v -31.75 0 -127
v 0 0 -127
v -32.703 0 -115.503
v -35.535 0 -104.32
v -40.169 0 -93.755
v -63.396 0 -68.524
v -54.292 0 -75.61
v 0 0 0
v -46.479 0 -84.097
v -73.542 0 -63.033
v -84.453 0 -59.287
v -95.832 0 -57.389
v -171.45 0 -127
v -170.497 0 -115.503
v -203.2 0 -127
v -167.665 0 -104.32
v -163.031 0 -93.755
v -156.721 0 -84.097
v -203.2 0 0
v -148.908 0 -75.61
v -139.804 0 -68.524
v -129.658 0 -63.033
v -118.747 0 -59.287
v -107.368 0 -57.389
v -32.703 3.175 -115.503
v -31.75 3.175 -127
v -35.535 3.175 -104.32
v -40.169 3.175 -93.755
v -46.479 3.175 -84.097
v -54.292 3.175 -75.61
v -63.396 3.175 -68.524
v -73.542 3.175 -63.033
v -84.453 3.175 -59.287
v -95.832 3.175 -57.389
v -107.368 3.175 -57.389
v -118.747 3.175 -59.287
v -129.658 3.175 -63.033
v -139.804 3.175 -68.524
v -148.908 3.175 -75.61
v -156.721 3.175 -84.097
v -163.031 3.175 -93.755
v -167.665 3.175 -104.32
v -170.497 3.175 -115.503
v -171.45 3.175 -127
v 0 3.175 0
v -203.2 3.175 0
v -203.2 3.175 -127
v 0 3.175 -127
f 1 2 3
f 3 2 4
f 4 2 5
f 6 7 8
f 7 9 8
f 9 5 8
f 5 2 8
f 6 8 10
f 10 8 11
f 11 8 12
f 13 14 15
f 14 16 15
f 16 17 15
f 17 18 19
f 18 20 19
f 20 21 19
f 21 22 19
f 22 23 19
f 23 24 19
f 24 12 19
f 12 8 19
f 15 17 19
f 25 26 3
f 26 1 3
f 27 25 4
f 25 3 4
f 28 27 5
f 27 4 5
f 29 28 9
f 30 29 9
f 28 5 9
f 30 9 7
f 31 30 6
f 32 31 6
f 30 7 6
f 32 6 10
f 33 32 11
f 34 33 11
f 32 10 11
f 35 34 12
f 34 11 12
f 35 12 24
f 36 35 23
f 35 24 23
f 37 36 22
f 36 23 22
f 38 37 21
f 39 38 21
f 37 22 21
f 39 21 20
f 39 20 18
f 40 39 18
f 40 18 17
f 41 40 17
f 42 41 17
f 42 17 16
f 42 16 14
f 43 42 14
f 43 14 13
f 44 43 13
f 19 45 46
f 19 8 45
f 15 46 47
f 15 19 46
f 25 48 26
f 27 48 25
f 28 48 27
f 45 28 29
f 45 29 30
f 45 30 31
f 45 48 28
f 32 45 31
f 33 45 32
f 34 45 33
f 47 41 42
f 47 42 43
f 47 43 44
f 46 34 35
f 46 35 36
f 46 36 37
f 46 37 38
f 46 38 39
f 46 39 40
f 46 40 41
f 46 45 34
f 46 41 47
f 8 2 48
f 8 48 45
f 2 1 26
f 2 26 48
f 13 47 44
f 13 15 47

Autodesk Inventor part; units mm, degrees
ref_plane "YZ Plane" through (0, 0, 0) normal (1, 0, 0) x (0, 1, 0)
ref_plane "XZ Plane" through (0, 0, 0) normal (0, 1, 0) x (-1, 0, 0)
ref_plane "XY Plane" through (0, 0, 0) normal (0, 0, 1) x (1, 0, 0)
sketch "Sketch1" plane through (0, 0, 0) normal (0, 1, 0) x (-1, 0, 0)
  line L0 (0, 0) -> (203.2, 0)
  line L1 (203.2, 0) -> (203.2, -254)
  line L2 (203.2, -254) -> (0, -254)
  line L3 (0, -254) -> (0, 0)
  line L4 (203.2, -127) -> (0, -127)
  line L5 (101.6, -254) -> (101.6, 0)
  circle A0 centre (101.6, -127) radius 69.85
  point P0 (171.45, -127)
  point P1 (31.75, -127)
  dimension "d0" = 203.2
  dimension "d1" = 254
  dimension "d2" = 139.7
extrude "Extrusion1" add sketch "Sketch1" along normal blind 3.175 contours L0 L5 A0 L4 L3 | L0 L1 L4 A0 L5
properties part number "2 Bottom Frame Base 2"
